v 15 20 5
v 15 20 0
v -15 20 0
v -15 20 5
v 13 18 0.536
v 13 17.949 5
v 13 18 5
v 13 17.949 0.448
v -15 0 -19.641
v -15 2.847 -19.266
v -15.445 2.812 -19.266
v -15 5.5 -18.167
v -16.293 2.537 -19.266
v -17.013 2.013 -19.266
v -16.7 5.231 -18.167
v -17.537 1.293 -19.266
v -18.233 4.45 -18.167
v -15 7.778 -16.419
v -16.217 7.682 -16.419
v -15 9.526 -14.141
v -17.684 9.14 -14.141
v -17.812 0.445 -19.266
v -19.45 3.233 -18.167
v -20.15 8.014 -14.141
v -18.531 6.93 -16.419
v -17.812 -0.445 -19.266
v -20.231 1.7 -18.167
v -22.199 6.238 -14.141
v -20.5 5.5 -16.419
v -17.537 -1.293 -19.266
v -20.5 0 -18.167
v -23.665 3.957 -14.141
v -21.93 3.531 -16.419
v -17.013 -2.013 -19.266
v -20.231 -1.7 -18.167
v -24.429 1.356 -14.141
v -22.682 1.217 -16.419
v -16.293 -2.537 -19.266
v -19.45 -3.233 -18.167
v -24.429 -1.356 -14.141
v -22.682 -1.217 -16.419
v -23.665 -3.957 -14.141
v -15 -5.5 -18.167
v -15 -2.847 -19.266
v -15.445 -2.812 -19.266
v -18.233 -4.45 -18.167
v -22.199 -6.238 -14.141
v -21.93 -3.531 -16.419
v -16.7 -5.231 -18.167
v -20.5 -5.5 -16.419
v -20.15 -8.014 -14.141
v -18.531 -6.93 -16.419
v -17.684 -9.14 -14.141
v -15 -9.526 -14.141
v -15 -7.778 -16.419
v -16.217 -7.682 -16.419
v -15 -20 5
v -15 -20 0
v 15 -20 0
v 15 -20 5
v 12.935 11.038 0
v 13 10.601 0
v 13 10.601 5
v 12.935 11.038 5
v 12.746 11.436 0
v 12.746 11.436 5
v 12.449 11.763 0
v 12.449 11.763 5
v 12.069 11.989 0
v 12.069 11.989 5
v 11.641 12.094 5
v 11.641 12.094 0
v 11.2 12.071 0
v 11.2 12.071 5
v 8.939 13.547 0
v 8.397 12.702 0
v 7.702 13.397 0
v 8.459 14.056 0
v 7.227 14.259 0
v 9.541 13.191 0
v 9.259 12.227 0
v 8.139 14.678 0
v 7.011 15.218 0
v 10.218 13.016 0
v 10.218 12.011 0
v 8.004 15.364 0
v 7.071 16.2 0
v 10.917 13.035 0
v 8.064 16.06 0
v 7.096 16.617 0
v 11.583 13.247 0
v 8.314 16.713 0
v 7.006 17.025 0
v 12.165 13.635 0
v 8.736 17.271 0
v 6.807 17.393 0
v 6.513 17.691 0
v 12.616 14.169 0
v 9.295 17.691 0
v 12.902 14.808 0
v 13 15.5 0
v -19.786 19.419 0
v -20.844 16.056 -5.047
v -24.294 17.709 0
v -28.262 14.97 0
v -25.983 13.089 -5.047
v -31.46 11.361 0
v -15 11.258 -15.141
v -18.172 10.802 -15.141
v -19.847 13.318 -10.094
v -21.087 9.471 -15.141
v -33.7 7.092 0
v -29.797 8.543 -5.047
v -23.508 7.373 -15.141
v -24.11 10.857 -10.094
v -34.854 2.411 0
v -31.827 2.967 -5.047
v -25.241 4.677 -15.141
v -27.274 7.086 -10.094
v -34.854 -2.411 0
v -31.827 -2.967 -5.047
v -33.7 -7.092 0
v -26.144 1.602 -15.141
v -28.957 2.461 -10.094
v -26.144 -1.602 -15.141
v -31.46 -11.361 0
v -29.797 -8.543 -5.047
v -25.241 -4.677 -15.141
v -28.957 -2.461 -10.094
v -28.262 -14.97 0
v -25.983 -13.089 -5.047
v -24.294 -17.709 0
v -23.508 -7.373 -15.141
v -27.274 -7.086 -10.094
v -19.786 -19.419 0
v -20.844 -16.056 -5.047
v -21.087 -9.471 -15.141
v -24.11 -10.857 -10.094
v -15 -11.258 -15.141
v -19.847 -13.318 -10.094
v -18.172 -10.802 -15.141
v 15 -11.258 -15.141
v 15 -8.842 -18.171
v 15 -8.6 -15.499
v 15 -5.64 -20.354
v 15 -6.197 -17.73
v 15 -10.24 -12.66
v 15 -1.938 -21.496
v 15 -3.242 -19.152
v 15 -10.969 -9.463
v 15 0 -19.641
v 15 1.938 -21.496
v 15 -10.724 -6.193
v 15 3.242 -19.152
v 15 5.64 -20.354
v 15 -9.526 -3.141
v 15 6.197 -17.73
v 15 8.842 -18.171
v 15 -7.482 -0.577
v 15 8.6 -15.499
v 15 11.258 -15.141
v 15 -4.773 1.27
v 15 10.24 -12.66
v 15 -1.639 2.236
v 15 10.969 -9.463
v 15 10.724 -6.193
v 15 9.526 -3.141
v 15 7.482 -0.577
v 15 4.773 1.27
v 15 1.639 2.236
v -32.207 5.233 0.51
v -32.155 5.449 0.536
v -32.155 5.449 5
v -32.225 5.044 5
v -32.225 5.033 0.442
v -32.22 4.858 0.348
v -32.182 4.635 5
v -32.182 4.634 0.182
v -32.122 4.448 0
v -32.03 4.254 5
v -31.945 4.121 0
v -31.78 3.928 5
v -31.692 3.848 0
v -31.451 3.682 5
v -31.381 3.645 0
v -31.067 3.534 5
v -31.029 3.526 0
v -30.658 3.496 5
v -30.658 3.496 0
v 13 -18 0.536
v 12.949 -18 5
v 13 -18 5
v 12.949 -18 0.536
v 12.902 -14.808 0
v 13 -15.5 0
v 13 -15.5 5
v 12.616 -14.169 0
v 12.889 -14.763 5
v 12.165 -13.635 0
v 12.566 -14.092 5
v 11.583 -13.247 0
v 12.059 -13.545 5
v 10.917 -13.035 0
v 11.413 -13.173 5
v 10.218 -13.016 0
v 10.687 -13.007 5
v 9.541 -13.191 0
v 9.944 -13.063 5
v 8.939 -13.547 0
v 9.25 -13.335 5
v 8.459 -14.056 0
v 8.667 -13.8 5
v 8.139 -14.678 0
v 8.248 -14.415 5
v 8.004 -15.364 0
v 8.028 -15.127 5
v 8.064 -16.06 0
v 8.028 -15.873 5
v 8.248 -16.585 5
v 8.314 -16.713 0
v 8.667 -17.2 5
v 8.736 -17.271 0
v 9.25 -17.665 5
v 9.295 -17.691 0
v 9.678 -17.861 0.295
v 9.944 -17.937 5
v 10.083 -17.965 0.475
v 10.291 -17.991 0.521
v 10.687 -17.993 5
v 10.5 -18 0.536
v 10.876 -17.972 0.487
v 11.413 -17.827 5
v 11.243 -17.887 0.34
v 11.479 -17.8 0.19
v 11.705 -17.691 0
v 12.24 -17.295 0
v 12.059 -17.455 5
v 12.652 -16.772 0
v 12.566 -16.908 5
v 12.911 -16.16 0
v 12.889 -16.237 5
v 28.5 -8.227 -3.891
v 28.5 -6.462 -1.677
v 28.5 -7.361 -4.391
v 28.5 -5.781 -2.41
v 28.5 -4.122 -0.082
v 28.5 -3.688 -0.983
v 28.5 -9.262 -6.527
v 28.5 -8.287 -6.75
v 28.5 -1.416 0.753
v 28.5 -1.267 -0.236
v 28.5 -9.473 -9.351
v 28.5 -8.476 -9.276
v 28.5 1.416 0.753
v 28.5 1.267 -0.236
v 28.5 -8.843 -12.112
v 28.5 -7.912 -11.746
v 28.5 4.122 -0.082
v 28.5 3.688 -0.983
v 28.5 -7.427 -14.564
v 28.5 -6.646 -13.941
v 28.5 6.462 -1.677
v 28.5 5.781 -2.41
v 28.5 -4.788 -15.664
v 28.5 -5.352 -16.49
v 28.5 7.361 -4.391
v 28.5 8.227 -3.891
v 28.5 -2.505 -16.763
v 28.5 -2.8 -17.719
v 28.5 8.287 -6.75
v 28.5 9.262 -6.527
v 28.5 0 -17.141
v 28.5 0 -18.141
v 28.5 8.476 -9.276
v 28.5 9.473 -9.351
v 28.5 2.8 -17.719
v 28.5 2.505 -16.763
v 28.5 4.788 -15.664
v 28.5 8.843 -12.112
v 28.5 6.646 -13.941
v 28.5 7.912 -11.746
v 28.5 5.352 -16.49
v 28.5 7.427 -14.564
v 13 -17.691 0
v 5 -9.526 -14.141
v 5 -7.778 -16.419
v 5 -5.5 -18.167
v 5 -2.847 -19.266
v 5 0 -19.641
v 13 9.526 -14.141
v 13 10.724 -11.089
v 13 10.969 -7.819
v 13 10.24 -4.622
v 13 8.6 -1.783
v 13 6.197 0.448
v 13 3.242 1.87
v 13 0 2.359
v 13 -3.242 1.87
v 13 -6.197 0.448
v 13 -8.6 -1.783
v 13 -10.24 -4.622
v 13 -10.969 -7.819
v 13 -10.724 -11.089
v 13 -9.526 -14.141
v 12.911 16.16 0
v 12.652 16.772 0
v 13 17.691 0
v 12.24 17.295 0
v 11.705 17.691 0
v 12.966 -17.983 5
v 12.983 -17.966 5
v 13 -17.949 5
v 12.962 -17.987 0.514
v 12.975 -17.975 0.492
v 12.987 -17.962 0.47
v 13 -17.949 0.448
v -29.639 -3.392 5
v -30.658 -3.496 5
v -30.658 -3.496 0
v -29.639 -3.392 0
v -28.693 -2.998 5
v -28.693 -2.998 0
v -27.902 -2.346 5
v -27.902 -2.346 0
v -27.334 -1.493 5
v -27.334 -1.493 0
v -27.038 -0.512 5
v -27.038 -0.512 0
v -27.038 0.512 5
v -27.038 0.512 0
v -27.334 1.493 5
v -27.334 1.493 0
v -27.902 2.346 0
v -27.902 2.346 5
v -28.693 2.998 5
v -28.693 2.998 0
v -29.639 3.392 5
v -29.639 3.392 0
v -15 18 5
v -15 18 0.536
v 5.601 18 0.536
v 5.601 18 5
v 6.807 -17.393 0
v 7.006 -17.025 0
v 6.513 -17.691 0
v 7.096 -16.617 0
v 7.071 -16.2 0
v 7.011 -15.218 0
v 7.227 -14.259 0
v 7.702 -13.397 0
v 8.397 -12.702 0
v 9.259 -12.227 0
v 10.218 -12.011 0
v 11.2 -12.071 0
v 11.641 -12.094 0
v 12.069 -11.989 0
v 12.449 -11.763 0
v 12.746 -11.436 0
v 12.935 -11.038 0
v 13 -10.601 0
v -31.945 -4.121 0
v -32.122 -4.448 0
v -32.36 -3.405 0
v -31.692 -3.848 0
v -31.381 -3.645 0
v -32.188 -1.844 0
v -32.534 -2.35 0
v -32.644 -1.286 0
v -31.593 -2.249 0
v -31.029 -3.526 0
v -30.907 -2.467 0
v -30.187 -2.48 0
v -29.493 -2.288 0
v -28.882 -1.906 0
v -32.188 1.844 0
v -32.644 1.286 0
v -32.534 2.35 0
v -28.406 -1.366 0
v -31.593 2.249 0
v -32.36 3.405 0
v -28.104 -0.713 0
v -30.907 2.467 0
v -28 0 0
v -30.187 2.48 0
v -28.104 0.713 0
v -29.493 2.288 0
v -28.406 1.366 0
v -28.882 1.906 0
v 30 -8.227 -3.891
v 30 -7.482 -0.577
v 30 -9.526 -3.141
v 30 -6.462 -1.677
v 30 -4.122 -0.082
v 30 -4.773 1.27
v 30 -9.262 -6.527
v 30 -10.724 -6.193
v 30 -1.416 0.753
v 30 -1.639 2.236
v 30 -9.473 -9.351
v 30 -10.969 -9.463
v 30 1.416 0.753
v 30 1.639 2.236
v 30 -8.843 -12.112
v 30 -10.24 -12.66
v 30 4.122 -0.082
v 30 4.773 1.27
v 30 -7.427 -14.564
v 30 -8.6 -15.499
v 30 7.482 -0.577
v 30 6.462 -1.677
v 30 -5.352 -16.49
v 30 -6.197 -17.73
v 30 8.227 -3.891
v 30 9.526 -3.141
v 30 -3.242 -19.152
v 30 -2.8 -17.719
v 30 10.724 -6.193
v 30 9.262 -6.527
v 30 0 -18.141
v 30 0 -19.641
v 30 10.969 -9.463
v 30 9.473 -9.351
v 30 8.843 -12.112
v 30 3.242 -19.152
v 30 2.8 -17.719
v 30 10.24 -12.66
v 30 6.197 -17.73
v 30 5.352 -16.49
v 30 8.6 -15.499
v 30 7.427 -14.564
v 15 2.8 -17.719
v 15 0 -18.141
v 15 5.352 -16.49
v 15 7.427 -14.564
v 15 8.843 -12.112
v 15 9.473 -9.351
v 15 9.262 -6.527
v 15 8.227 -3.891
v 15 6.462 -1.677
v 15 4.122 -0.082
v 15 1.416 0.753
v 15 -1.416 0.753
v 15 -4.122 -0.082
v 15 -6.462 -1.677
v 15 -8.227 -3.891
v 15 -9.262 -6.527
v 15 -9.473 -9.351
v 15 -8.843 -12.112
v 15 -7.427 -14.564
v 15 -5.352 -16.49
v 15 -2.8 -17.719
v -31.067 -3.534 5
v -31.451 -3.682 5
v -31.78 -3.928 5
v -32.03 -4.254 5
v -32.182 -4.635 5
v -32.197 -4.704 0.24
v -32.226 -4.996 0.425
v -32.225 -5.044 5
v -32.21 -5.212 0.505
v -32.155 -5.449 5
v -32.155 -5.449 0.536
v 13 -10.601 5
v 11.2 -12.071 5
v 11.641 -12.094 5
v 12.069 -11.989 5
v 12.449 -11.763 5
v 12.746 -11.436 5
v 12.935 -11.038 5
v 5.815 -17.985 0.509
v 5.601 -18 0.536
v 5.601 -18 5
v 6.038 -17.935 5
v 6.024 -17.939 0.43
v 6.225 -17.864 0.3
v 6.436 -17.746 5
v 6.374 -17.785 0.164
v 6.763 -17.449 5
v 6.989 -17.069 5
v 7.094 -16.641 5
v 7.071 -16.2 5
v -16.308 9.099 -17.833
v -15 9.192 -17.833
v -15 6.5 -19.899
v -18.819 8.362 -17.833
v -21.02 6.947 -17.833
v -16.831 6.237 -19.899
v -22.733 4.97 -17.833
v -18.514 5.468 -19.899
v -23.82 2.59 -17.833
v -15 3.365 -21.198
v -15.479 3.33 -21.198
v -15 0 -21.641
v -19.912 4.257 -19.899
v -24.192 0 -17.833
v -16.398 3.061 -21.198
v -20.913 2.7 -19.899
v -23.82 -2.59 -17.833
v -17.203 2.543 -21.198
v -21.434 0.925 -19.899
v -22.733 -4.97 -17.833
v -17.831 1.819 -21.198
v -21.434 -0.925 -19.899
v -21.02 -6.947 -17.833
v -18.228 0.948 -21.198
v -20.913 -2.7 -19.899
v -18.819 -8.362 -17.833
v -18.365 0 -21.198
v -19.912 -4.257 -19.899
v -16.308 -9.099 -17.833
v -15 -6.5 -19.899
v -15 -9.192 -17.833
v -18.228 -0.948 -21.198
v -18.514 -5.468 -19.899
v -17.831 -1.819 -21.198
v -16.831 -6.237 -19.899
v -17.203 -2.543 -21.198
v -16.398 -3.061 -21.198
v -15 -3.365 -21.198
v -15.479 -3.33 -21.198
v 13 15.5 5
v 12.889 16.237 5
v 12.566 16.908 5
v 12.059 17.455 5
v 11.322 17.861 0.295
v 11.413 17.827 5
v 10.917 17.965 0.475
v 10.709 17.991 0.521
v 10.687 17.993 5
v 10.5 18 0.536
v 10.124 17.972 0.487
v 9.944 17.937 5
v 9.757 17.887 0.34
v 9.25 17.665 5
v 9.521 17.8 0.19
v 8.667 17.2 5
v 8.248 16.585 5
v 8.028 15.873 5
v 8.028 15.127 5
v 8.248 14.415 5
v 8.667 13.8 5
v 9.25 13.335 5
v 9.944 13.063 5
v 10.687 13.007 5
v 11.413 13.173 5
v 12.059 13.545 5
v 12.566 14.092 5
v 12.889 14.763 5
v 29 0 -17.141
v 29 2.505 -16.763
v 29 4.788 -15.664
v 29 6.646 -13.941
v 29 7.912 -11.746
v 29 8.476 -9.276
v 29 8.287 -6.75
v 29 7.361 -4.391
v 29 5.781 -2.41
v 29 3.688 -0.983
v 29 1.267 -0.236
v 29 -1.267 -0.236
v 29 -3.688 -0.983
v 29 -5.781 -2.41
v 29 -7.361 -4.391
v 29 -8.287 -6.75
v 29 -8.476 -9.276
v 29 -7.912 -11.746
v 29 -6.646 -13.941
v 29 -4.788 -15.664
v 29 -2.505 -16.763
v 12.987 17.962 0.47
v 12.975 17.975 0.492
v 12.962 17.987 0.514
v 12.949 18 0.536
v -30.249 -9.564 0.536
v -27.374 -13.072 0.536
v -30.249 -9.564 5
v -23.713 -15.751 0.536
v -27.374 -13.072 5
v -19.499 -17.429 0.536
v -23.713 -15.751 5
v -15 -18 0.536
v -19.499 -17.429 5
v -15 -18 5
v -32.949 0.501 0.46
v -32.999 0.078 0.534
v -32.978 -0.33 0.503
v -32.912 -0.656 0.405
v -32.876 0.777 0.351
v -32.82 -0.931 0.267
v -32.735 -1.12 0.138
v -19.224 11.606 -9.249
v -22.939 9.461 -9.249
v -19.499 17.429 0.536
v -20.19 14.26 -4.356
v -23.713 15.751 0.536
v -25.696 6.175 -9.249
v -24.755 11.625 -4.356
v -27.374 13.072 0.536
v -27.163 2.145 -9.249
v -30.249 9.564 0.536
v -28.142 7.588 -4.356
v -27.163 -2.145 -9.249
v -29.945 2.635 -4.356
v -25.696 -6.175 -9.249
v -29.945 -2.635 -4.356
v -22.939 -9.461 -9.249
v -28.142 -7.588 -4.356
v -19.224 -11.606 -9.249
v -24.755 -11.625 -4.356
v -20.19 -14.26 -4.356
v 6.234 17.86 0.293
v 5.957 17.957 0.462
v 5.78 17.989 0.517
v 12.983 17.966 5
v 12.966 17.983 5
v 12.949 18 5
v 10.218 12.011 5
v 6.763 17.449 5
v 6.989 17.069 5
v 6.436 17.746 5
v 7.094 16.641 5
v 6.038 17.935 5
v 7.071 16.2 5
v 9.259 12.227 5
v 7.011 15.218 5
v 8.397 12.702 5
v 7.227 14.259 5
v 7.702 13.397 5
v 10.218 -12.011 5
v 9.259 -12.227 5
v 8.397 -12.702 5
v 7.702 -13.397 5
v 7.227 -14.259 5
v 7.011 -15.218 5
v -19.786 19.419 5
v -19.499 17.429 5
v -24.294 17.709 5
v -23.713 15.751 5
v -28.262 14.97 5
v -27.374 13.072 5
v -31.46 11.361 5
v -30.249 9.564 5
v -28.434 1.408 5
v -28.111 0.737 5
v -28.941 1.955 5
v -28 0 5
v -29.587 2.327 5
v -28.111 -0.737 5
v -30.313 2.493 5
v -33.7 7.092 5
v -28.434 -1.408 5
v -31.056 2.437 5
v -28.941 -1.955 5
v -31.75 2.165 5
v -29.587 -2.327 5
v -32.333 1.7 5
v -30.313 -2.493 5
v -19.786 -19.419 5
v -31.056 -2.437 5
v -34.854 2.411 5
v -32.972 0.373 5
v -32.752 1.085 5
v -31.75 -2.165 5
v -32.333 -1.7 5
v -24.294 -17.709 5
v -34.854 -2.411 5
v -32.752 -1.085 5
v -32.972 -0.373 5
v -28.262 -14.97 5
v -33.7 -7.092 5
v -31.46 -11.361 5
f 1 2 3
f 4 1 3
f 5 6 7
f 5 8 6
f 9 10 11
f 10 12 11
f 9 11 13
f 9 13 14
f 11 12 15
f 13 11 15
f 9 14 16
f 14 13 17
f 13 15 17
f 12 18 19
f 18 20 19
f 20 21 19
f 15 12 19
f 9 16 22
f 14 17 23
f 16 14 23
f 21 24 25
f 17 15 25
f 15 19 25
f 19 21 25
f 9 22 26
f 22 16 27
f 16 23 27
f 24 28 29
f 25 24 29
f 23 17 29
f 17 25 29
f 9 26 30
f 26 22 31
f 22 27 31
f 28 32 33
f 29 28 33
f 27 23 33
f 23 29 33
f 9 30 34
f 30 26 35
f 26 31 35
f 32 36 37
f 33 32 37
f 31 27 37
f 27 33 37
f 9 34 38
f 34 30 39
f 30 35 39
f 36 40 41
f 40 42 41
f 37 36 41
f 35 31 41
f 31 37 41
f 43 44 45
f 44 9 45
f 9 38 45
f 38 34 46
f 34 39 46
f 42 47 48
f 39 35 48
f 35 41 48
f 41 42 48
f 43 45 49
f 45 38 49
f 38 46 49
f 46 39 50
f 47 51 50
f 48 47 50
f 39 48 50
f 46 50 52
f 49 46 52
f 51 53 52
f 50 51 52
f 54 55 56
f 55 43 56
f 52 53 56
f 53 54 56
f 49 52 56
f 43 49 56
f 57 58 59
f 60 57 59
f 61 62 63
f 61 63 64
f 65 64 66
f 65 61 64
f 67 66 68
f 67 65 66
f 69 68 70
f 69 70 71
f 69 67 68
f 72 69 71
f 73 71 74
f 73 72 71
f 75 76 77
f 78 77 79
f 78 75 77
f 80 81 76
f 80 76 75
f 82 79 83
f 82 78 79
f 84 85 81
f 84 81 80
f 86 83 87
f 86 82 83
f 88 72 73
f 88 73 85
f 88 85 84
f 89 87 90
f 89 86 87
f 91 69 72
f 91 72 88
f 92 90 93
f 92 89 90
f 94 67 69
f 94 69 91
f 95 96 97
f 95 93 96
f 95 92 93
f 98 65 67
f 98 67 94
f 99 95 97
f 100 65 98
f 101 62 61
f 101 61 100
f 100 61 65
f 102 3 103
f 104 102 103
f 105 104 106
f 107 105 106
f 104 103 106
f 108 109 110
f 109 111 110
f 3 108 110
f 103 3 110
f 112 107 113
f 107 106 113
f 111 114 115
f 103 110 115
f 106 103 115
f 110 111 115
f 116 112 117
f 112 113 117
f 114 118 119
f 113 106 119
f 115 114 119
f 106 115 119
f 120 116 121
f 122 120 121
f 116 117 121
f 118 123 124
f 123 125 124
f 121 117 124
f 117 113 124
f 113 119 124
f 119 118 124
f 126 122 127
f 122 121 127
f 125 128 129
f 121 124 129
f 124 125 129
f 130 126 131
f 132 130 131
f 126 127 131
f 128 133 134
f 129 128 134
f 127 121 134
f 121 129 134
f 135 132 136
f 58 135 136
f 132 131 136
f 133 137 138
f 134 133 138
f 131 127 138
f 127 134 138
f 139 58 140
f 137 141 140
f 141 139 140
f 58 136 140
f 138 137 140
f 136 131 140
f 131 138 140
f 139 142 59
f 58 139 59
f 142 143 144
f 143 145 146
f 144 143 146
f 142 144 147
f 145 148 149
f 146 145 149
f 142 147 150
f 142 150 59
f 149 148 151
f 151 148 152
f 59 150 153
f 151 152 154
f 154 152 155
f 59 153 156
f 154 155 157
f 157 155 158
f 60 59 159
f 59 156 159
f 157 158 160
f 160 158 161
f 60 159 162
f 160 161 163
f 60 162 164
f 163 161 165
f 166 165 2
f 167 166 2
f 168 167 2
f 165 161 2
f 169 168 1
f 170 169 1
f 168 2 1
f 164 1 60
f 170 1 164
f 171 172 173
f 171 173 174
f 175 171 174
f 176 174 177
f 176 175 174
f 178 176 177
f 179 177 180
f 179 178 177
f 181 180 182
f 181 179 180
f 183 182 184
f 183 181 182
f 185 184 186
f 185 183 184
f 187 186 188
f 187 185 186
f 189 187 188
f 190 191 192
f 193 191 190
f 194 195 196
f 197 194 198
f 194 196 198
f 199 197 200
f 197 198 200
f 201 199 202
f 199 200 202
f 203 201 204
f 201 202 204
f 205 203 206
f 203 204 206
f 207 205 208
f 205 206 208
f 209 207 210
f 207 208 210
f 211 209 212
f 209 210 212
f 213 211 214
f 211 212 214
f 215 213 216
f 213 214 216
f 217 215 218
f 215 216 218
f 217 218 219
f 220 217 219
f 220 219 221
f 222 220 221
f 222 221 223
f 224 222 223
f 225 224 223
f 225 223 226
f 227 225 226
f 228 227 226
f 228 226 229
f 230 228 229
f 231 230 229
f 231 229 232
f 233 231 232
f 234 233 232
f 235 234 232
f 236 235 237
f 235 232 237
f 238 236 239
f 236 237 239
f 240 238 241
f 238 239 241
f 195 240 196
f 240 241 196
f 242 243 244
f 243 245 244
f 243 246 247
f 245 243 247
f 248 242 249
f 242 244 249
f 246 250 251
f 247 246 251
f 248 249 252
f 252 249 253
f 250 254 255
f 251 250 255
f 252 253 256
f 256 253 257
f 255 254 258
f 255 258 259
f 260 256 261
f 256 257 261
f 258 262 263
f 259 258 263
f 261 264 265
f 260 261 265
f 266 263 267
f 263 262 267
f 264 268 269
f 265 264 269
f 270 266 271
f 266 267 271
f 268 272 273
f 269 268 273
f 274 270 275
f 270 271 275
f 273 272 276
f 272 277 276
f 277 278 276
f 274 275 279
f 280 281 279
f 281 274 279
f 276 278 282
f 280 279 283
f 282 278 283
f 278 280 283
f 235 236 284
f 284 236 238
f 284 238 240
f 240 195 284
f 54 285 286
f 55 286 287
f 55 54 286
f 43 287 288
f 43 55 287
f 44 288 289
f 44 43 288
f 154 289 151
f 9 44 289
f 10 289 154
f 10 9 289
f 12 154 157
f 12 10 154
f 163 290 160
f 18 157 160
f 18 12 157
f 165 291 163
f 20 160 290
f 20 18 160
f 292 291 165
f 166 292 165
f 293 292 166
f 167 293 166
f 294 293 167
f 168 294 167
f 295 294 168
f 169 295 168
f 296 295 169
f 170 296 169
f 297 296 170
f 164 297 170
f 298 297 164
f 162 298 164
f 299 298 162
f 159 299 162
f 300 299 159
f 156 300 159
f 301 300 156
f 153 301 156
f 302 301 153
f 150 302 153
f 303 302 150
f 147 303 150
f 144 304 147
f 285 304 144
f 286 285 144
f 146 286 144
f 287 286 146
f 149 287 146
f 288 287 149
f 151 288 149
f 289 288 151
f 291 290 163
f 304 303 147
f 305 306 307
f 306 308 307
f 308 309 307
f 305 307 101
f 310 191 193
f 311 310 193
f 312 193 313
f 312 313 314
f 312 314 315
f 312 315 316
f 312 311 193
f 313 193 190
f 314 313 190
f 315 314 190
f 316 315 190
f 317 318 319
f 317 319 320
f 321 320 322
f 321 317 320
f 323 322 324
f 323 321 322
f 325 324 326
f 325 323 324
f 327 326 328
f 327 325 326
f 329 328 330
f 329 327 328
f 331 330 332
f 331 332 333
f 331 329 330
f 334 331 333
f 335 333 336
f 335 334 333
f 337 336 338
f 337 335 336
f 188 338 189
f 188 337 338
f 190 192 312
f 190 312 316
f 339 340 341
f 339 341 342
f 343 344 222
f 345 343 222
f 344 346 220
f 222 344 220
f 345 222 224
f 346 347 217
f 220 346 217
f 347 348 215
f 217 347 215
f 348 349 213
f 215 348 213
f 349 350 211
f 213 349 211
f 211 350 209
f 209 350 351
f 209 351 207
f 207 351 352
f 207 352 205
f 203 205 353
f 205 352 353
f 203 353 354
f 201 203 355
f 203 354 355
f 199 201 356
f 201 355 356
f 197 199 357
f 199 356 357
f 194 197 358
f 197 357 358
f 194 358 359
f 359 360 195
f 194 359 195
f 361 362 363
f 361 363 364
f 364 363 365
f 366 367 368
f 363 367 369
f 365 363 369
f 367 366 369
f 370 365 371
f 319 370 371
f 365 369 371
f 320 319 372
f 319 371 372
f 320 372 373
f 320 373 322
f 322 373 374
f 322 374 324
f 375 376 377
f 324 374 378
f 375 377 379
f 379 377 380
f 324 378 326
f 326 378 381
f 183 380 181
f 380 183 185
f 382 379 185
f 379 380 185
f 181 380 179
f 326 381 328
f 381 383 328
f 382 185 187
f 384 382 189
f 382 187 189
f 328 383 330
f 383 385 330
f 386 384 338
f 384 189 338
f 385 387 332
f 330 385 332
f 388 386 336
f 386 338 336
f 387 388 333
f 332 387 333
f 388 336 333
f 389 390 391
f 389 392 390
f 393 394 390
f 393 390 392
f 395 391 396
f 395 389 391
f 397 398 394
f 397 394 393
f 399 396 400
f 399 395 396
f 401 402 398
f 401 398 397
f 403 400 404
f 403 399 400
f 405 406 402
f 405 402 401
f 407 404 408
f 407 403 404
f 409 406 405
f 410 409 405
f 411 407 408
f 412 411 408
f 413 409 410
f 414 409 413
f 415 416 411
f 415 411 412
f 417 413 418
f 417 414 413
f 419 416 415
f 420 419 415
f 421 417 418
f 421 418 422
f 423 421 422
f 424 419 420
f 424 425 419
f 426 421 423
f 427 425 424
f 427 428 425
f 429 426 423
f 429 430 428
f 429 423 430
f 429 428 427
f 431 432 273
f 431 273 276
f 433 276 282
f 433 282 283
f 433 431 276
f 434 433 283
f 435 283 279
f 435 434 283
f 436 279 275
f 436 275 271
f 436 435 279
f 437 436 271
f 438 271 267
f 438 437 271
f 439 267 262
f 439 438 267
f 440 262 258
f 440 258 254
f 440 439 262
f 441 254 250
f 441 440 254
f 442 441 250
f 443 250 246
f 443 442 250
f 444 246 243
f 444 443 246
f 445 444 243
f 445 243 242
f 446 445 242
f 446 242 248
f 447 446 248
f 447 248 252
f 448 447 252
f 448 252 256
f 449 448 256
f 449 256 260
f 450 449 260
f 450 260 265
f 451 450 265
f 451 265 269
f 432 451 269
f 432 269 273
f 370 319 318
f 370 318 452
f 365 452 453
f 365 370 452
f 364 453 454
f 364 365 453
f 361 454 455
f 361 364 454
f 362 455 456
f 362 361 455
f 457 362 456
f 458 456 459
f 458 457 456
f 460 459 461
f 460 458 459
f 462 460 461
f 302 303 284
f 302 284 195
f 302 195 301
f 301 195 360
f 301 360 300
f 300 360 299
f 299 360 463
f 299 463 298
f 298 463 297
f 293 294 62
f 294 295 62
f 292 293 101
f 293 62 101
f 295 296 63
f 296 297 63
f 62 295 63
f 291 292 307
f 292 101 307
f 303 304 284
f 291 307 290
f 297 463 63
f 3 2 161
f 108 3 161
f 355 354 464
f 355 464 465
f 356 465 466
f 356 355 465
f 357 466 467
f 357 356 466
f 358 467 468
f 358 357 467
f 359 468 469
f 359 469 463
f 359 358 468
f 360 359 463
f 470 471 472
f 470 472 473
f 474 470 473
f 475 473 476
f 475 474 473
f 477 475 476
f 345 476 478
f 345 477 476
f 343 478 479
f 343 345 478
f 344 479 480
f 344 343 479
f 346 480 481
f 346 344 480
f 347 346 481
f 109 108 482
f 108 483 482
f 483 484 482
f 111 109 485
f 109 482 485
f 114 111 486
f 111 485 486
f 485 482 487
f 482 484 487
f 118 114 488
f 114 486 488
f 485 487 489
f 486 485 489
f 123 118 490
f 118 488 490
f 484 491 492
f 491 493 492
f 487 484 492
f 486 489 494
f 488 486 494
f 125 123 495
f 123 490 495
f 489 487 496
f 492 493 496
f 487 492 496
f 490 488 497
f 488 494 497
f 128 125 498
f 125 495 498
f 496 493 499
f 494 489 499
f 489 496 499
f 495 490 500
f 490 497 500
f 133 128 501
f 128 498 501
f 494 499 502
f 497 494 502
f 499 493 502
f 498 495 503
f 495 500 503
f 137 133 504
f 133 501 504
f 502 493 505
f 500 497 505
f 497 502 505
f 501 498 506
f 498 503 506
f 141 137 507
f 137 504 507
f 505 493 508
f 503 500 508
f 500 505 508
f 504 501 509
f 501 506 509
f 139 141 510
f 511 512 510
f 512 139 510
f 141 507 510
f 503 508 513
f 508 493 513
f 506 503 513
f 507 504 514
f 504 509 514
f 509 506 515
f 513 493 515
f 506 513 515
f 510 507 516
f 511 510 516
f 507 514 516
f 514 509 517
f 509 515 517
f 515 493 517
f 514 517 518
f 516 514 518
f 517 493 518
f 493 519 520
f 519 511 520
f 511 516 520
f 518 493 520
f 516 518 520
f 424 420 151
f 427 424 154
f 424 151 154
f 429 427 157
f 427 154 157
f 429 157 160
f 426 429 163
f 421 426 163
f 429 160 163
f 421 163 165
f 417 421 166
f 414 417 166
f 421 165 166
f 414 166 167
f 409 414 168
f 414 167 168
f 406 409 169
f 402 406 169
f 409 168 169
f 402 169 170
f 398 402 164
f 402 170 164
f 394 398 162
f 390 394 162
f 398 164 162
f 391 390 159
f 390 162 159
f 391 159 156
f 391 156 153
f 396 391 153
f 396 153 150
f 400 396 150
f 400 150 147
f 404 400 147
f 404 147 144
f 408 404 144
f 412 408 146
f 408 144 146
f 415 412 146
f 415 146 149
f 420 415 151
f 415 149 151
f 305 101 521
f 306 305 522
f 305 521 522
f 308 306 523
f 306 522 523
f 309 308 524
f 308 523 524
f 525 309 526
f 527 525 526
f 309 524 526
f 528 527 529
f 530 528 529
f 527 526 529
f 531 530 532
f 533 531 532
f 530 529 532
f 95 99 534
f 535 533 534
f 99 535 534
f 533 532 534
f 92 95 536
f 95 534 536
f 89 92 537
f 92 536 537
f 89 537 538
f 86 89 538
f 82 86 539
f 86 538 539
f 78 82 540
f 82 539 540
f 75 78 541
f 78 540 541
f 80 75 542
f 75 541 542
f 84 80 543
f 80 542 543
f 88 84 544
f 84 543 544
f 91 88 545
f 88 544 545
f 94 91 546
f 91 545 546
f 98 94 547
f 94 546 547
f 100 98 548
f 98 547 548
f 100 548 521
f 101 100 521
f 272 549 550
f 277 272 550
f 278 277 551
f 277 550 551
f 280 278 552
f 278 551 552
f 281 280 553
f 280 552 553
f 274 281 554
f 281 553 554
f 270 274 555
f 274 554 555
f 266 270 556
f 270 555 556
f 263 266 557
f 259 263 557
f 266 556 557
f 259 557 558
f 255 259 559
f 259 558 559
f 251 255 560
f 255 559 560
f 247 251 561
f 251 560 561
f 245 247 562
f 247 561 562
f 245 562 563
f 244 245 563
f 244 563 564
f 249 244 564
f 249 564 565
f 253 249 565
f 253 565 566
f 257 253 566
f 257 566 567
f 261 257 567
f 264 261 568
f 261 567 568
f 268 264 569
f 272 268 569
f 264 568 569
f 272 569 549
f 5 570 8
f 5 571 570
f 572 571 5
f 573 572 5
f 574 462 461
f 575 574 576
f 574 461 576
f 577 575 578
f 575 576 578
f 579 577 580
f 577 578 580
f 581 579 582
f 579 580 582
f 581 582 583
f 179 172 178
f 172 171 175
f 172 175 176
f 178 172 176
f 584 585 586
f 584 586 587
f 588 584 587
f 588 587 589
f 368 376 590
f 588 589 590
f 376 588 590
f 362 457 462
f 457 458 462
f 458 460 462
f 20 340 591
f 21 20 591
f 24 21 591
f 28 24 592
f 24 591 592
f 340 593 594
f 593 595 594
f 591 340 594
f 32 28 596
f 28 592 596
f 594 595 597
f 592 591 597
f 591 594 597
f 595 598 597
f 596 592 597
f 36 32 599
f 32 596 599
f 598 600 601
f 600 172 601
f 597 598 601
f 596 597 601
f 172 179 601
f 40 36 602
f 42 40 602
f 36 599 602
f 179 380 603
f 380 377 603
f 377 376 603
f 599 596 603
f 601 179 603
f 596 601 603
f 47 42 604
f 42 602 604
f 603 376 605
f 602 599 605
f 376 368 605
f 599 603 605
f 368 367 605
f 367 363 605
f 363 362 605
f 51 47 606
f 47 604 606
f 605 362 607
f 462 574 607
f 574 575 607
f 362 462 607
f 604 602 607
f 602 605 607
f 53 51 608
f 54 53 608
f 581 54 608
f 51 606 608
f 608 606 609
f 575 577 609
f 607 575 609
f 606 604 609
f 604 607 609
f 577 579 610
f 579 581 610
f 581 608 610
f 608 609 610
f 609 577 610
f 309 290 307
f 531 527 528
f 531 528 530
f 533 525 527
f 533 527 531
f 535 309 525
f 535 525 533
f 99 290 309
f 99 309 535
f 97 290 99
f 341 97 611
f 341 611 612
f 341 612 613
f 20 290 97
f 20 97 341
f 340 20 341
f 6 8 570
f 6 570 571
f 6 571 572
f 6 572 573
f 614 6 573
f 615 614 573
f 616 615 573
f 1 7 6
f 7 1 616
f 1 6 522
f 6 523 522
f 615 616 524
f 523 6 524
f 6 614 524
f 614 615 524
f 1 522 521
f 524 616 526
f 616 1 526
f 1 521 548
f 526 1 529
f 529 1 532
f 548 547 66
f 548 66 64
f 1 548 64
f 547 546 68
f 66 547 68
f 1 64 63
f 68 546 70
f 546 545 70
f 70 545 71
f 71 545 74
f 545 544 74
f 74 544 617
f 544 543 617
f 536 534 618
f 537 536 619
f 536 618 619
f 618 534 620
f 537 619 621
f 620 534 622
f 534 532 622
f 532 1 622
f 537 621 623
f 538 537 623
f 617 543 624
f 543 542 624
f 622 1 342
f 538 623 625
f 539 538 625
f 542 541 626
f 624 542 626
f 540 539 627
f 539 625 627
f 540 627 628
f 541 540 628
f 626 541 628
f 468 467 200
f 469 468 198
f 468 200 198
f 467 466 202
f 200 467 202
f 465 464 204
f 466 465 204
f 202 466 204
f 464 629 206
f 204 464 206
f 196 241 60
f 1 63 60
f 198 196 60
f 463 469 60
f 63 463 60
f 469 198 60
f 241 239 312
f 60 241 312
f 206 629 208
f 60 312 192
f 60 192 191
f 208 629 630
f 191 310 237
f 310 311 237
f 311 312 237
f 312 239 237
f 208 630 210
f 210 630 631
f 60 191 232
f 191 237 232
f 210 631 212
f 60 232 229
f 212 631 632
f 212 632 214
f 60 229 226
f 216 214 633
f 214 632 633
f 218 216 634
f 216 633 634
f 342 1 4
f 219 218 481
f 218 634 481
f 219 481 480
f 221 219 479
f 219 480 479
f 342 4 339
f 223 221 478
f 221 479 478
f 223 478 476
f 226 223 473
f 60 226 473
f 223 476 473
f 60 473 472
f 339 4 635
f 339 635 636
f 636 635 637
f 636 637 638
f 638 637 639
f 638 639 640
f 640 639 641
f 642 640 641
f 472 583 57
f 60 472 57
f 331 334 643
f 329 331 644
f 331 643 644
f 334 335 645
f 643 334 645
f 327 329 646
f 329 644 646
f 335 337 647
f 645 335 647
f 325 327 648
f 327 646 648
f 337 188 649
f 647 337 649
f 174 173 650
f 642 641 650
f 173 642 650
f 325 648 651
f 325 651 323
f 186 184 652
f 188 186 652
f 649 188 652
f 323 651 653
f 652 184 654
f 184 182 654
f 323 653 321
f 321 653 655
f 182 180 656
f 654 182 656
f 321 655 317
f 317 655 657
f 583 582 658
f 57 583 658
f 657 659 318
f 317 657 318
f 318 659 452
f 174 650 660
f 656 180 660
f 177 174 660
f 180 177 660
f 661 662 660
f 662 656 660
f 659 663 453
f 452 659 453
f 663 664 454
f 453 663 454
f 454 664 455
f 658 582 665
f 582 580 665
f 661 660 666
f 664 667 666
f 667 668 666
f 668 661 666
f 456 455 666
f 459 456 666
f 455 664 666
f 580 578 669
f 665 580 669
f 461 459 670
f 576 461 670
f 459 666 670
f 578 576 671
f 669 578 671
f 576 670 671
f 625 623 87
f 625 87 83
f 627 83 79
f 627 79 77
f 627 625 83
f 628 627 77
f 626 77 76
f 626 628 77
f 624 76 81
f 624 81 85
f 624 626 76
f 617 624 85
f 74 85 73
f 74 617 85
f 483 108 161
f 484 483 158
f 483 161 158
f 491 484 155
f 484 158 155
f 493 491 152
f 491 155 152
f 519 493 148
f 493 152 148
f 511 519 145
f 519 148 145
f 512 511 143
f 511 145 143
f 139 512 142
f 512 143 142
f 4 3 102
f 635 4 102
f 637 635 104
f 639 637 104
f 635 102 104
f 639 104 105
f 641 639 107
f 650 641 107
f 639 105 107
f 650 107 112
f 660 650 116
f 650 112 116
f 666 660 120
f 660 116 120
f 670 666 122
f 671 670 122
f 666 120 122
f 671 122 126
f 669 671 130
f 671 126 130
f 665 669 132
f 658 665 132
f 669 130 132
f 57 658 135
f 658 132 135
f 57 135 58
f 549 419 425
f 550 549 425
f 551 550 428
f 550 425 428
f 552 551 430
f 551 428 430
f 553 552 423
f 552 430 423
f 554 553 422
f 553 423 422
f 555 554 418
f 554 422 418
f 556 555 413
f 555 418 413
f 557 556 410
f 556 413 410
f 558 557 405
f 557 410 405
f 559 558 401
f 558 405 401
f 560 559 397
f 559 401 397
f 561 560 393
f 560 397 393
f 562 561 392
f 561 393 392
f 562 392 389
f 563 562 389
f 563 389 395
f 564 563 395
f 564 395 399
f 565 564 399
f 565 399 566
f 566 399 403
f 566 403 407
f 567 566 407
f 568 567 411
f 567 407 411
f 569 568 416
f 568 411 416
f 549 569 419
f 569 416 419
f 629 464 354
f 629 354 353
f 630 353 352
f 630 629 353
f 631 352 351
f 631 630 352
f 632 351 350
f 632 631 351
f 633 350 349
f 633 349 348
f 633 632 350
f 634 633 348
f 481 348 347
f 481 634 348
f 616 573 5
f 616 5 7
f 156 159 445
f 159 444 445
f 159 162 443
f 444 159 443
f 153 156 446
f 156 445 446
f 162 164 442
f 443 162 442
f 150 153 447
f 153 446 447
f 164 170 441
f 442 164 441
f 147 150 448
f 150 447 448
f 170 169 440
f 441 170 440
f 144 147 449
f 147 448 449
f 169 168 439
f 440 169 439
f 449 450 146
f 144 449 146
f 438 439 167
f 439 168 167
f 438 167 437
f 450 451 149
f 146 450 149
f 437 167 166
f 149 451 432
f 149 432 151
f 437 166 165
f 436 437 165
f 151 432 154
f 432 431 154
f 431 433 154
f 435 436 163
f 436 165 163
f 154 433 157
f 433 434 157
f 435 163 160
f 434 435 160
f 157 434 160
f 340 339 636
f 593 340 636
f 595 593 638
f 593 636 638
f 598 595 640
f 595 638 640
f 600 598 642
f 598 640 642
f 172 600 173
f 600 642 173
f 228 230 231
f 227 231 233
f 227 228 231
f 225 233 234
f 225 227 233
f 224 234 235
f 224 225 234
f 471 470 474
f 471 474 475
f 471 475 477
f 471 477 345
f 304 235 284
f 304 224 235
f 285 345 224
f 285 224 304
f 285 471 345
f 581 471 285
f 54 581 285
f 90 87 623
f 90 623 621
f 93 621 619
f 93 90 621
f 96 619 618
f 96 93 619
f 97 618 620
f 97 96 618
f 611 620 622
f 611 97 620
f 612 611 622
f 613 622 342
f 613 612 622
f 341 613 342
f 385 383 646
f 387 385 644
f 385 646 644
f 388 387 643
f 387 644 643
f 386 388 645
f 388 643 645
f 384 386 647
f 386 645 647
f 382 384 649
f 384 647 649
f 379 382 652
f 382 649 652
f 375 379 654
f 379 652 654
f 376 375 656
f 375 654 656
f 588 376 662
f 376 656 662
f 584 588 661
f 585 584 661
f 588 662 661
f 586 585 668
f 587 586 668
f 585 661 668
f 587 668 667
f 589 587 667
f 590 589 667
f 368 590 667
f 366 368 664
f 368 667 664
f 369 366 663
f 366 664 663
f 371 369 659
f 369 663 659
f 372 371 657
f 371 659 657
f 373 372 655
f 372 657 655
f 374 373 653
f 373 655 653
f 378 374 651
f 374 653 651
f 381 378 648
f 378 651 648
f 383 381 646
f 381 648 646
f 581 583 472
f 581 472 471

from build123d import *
from build123d.topology import SkipClean

# Parameters (mm, degrees)
EXTRUDE_3_DEPTH     = 5
EXTRUDE_4_DEPTH     = 30
REVOLVE_2_ANGLE     = 180
SKETCH_7_R          = 11
CUT_EXTRUDE_1_DEPTH = 10
SHELL_START         = -15.0000001
SHELL_1_DEPTH       = 28.0000001
SKETCH_8_R          = 3.5
SKETCH_8_R_2        = 2.5
EXTRUDE_5_DEPTH     = 5
FILLET_2_R          = 1.5
SKETCH_9_R          = 11
SKETCH_9_R_2        = 9.5
EXTRUDE_6_DEPTH     = 15
SKETCH_10_R         = 9.5
SKETCH_10_R_2       = 8.5
EXTRUDE_7_DEPTH     = 1.5
CHAMFER_1_SIZE      = 1


with BuildPart() as part:
    # 草图4 → 凸台-拉伸3 (new body)
    with BuildSketch(Plane.XY):
        with BuildLine():
            Line((15, 20), (-15, 20))
            ThreePointArc((-15, 20), (-35, 0), (-15, -20))
            Line((-15, -20), (15, -20))
            Line((15, -20), (15, 20))
        make_face()
    extrude(amount=EXTRUDE_3_DEPTH)

    # 草图5 → 凸台-拉伸4 (add)
    with BuildSketch(Plane(origin=(15, 0, 0), x_dir=(0, 0, -1), z_dir=(1, 0, 0))):
        with BuildLine():
            Line((0, 20), (15.141016151, 11.258330249))
            ThreePointArc((15.141016151, 11.258330249), (21.641016151, 0), (15.141016151, -11.258330249))
            Line((15.141016151, -11.258330249), (0, -20))
            Line((0, -20), (0, 20))
        make_face()
    extrude(amount=-EXTRUDE_4_DEPTH)

    # 草图6 → 旋转2 (revolve)
    with BuildSketch(Plane.ZY.offset(15)):
        with BuildLine():
            Line((-21.641016151, 0), (0, 0))
            Line((0, 0), (0, 20))
            Line((0, 20), (-15.141016151, 11.258330249))
            ThreePointArc((-15.141016151, 11.258330249), (-19.899346401, 6.5), (-21.641016151, 0))
        make_face()
    revolve(axis=Axis((-15, 0, 0), (0, 0, 1)), revolution_arc=REVOLVE_2_ANGLE)

    # 草图7 → 切除-拉伸1 (cut)
    with BuildSketch(Plane(origin=(15, 0, 0), x_dir=(0, 0, -1), z_dir=(1, 0, 0))):
        with Locations((8.641016151, 0)):
            Circle(SKETCH_7_R)
    extrude(amount=-CUT_EXTRUDE_1_DEPTH, mode=Mode.SUBTRACT)

    # 抽壳1: read off the stored shape, not the designer's step
    # 抽壳1 outline → 抽壳1 (cut)
    with SkipClean():  # the faces are left unmerged after this step: merging them gives an invalid solid
        with BuildSketch(Plane.YZ.offset(SHELL_START)):
            with BuildLine():
                ThreePointArc((-9.526279442, -14.141016151), (0, -19.641016151), (9.526279442, -14.141016151))
                Line((9.526279442, -14.141016151), (18, 0.535898385))
                Line((18, 0.535898385), (18, 5))
                Line((18, 5), (-18, 5))
                Line((-18, 5), (-18, 0.535898385))
                Line((-18, 0.535898385), (-9.526279442, -14.141016151))
            make_face()
        extrude(amount=SHELL_1_DEPTH, mode=Mode.SUBTRACT)
    add(part.part.scale(1), mode=Mode.REPLACE)  # the faces are merged on a copy

    # Shell 1 2 outline → Shell 1 2 (revolve, cut)
    with BuildSketch(Plane(origin=(-15, 0, 0), x_dir=(1, 0, 0), z_dir=(0, -1, 0))):
        with BuildLine():
            Line((18, 0.535898385), (18, 5))
            Line((18, 5), (0, 5))
            Line((0, 5), (0, -19.641016151))
            ThreePointArc((0, -19.641016151), (5.5, -18.167295593), (9.526279442, -14.141016151))
            Line((9.526279442, -14.141016151), (18, 0.535898385))
        make_face()
    revolve(axis=Axis((-15, 0, 0), (0, 0, 1)), mode=Mode.SUBTRACT)

    # 草图8 → 凸台-拉伸5 (add)
    # profile 1 of 3: a face of its own
    with BuildSketch(Plane.XY.offset(5)):
        with Locations((-30.5, 0)):
            Circle(SKETCH_8_R)
        with Locations((-30.5, 0)):
            Circle(SKETCH_8_R_2, mode=Mode.SUBTRACT)
    # profile 2 of 3: a face of its own
    with BuildSketch(Plane.XY.offset(5)):
        with Locations((10.5, 15.5)):
            Circle(SKETCH_8_R)
        with Locations((10.5, 15.5)):
            Circle(SKETCH_8_R_2, mode=Mode.SUBTRACT)
    # profile 3 of 3: a face of its own
    with BuildSketch(Plane.XY.offset(5)):
        with Locations((10.5, -15.5)):
            Circle(SKETCH_8_R)
        with Locations((10.5, -15.5)):
            Circle(SKETCH_8_R_2, mode=Mode.SUBTRACT)
    extrude(amount=-EXTRUDE_5_DEPTH)

    # 圆角2
    # the kernel refuses this fillet: 1.5 mm, written as the material it adds along each edge
    with BuildSketch(Plane(origin=(13, -13.050510257, 0), x_dir=(0, 1, 0), z_dir=(0, 0, 1))) as fillet_2_piece_1:
        with BuildLine():
            CenterArc((2.449489743, 1.5), FILLET_2_R, 168.463040967, 101.536959033)
            ThreePointArc((0.979795897, 1.8), (0.624595487, 0.826679947), (0, 0))
            Line((0, 0), (2.449489743, 0))
        make_face()
    extrude(amount=5)
    with BuildSketch(Plane(origin=(8.050510257, -18, -5.587825972), x_dir=(-1, 0, 0), z_dir=(0, 0, 1))) as fillet_2_piece_2_section:
        with BuildLine():
            CenterArc((2.449489743, -1.5), FILLET_2_R, 90, 101.536959033)
            ThreePointArc((0.979795897, -1.8), (0.624595487, -0.826679947), (0, 0))
            Line((0, 0), (2.449489743, 0))
        make_face()
    fillet_2_piece_2 = extrude(amount=10.587825972, mode=Mode.PRIVATE)
    fillet_2_piece_2 = split(fillet_2_piece_2, bisect_by=Plane(origin=(8.050510257, -18, 0), z_dir=(0, 0, 1)), keep=Keep.TOP, mode=Mode.PRIVATE)
    add(fillet_2_piece_2)
    with BuildSketch(Plane(origin=(8.050510257, 18, -5.587825972), x_dir=(-1, 0, 0), z_dir=(0, 0, 1))) as fillet_2_piece_3_section:
        with BuildLine():
            CenterArc((2.449489743, 1.5), FILLET_2_R, 168.463040967, 101.536959033)
            ThreePointArc((0.979795897, 1.8), (0.624595487, 0.826679947), (0, 0))
            Line((0, 0), (2.449489743, 0))
        make_face()
    fillet_2_piece_3 = extrude(amount=10.587825972, mode=Mode.PRIVATE)
    fillet_2_piece_3 = split(fillet_2_piece_3, bisect_by=Plane(origin=(8.050510257, 18, 0), z_dir=(0, 0, 1)), keep=Keep.TOP, mode=Mode.PRIVATE)
    add(fillet_2_piece_3)
    with BuildSketch(Plane(origin=(13, 13.050510257, 0), x_dir=(0, -1, 0), z_dir=(0, 0, 1))) as fillet_2_piece_4:
        with BuildLine():
            CenterArc((2.449489743, -1.5), FILLET_2_R, 90, 101.536959033)
            ThreePointArc((0.979795897, -1.8), (0.624595487, -0.826679947), (0, 0))
            Line((0, 0), (2.449489743, 0))
        make_face()
    extrude(amount=5)
    with BuildSketch(Plane(origin=(-32.806451613, -2.632542679, -6.690855654), x_dir=(0.22521397209049301, -0.974309328075649, 0), z_dir=(0, 0, 1))) as fillet_2_piece_5_section:
        with BuildLine():
            CenterArc((2.770255715, 1.495156442), FILLET_2_R, 164.396107483, 110.209545374)
            ThreePointArc((1.325539273, 1.898634324), (0.824332497, 0.836521394), (0, 0))
            ThreePointArc((0, 0), (1.445350808, -0.0581227), (2.890701616, 0))
        make_face()
    fillet_2_piece_5 = extrude(amount=11.690855654, mode=Mode.PRIVATE)
    fillet_2_piece_5 = split(fillet_2_piece_5, bisect_by=Plane(origin=(-32.806451613, -2.632542679, 0), z_dir=(0, 0, 1)), keep=Keep.TOP, mode=Mode.PRIVATE)
    add(fillet_2_piece_5)
    with BuildSketch(Plane(origin=(-32.806451613, 2.632542679, -6.690855654), x_dir=(0.2252139720904933, 0.974309328075649, 0), z_dir=(0, 0, 1))) as fillet_2_piece_6_section:
        with BuildLine():
            CenterArc((2.770255715, -1.495156442), FILLET_2_R, 85.394347143, 110.209545374)
            ThreePointArc((1.325539273, -1.898634324), (0.824332497, -0.836521394), (0, 0))
            ThreePointArc((0, 0), (1.445350808, 0.0581227), (2.890701616, 0))
        make_face()
    fillet_2_piece_6 = extrude(amount=11.690855654, mode=Mode.PRIVATE)
    fillet_2_piece_6 = split(fillet_2_piece_6, bisect_by=Plane(origin=(-32.806451613, 2.632542679, 0), z_dir=(0, 0, 1)), keep=Keep.TOP, mode=Mode.PRIVATE)
    add(fillet_2_piece_6)


with BuildPart() as body_2:
    # 草图9 → 凸台-拉伸6 (new body)
    with BuildSketch(Plane(origin=(15, 0, 0), x_dir=(0, 0, -1), z_dir=(1, 0, 0))):
        with Locations((8.641016151, 0)):
            Circle(SKETCH_9_R)
        with Locations((8.641016151, 0)):
            Circle(SKETCH_9_R_2, mode=Mode.SUBTRACT)
    extrude(amount=EXTRUDE_6_DEPTH)

    # 草图10 → 凸台-拉伸7 (add)
    with BuildSketch(Plane(origin=(30, 0, 0), x_dir=(0, 0, -1), z_dir=(1, 0, 0))):
        with Locations((8.641016151, 0)):
            Circle(SKETCH_10_R)
        with Locations((8.641016151, 0)):
            Circle(SKETCH_10_R_2, mode=Mode.SUBTRACT)
    extrude(amount=-EXTRUDE_7_DEPTH)

    # 倒角1
    chamfer_1_edges = [body_2.edges().sort_by_distance(p)[0] for p in [
        (30, 0, -0.141016151),
    ]]
    chamfer(chamfer_1_edges, length=CHAMFER_1_SIZE)


solid = Compound([part.part, body_2.part])
